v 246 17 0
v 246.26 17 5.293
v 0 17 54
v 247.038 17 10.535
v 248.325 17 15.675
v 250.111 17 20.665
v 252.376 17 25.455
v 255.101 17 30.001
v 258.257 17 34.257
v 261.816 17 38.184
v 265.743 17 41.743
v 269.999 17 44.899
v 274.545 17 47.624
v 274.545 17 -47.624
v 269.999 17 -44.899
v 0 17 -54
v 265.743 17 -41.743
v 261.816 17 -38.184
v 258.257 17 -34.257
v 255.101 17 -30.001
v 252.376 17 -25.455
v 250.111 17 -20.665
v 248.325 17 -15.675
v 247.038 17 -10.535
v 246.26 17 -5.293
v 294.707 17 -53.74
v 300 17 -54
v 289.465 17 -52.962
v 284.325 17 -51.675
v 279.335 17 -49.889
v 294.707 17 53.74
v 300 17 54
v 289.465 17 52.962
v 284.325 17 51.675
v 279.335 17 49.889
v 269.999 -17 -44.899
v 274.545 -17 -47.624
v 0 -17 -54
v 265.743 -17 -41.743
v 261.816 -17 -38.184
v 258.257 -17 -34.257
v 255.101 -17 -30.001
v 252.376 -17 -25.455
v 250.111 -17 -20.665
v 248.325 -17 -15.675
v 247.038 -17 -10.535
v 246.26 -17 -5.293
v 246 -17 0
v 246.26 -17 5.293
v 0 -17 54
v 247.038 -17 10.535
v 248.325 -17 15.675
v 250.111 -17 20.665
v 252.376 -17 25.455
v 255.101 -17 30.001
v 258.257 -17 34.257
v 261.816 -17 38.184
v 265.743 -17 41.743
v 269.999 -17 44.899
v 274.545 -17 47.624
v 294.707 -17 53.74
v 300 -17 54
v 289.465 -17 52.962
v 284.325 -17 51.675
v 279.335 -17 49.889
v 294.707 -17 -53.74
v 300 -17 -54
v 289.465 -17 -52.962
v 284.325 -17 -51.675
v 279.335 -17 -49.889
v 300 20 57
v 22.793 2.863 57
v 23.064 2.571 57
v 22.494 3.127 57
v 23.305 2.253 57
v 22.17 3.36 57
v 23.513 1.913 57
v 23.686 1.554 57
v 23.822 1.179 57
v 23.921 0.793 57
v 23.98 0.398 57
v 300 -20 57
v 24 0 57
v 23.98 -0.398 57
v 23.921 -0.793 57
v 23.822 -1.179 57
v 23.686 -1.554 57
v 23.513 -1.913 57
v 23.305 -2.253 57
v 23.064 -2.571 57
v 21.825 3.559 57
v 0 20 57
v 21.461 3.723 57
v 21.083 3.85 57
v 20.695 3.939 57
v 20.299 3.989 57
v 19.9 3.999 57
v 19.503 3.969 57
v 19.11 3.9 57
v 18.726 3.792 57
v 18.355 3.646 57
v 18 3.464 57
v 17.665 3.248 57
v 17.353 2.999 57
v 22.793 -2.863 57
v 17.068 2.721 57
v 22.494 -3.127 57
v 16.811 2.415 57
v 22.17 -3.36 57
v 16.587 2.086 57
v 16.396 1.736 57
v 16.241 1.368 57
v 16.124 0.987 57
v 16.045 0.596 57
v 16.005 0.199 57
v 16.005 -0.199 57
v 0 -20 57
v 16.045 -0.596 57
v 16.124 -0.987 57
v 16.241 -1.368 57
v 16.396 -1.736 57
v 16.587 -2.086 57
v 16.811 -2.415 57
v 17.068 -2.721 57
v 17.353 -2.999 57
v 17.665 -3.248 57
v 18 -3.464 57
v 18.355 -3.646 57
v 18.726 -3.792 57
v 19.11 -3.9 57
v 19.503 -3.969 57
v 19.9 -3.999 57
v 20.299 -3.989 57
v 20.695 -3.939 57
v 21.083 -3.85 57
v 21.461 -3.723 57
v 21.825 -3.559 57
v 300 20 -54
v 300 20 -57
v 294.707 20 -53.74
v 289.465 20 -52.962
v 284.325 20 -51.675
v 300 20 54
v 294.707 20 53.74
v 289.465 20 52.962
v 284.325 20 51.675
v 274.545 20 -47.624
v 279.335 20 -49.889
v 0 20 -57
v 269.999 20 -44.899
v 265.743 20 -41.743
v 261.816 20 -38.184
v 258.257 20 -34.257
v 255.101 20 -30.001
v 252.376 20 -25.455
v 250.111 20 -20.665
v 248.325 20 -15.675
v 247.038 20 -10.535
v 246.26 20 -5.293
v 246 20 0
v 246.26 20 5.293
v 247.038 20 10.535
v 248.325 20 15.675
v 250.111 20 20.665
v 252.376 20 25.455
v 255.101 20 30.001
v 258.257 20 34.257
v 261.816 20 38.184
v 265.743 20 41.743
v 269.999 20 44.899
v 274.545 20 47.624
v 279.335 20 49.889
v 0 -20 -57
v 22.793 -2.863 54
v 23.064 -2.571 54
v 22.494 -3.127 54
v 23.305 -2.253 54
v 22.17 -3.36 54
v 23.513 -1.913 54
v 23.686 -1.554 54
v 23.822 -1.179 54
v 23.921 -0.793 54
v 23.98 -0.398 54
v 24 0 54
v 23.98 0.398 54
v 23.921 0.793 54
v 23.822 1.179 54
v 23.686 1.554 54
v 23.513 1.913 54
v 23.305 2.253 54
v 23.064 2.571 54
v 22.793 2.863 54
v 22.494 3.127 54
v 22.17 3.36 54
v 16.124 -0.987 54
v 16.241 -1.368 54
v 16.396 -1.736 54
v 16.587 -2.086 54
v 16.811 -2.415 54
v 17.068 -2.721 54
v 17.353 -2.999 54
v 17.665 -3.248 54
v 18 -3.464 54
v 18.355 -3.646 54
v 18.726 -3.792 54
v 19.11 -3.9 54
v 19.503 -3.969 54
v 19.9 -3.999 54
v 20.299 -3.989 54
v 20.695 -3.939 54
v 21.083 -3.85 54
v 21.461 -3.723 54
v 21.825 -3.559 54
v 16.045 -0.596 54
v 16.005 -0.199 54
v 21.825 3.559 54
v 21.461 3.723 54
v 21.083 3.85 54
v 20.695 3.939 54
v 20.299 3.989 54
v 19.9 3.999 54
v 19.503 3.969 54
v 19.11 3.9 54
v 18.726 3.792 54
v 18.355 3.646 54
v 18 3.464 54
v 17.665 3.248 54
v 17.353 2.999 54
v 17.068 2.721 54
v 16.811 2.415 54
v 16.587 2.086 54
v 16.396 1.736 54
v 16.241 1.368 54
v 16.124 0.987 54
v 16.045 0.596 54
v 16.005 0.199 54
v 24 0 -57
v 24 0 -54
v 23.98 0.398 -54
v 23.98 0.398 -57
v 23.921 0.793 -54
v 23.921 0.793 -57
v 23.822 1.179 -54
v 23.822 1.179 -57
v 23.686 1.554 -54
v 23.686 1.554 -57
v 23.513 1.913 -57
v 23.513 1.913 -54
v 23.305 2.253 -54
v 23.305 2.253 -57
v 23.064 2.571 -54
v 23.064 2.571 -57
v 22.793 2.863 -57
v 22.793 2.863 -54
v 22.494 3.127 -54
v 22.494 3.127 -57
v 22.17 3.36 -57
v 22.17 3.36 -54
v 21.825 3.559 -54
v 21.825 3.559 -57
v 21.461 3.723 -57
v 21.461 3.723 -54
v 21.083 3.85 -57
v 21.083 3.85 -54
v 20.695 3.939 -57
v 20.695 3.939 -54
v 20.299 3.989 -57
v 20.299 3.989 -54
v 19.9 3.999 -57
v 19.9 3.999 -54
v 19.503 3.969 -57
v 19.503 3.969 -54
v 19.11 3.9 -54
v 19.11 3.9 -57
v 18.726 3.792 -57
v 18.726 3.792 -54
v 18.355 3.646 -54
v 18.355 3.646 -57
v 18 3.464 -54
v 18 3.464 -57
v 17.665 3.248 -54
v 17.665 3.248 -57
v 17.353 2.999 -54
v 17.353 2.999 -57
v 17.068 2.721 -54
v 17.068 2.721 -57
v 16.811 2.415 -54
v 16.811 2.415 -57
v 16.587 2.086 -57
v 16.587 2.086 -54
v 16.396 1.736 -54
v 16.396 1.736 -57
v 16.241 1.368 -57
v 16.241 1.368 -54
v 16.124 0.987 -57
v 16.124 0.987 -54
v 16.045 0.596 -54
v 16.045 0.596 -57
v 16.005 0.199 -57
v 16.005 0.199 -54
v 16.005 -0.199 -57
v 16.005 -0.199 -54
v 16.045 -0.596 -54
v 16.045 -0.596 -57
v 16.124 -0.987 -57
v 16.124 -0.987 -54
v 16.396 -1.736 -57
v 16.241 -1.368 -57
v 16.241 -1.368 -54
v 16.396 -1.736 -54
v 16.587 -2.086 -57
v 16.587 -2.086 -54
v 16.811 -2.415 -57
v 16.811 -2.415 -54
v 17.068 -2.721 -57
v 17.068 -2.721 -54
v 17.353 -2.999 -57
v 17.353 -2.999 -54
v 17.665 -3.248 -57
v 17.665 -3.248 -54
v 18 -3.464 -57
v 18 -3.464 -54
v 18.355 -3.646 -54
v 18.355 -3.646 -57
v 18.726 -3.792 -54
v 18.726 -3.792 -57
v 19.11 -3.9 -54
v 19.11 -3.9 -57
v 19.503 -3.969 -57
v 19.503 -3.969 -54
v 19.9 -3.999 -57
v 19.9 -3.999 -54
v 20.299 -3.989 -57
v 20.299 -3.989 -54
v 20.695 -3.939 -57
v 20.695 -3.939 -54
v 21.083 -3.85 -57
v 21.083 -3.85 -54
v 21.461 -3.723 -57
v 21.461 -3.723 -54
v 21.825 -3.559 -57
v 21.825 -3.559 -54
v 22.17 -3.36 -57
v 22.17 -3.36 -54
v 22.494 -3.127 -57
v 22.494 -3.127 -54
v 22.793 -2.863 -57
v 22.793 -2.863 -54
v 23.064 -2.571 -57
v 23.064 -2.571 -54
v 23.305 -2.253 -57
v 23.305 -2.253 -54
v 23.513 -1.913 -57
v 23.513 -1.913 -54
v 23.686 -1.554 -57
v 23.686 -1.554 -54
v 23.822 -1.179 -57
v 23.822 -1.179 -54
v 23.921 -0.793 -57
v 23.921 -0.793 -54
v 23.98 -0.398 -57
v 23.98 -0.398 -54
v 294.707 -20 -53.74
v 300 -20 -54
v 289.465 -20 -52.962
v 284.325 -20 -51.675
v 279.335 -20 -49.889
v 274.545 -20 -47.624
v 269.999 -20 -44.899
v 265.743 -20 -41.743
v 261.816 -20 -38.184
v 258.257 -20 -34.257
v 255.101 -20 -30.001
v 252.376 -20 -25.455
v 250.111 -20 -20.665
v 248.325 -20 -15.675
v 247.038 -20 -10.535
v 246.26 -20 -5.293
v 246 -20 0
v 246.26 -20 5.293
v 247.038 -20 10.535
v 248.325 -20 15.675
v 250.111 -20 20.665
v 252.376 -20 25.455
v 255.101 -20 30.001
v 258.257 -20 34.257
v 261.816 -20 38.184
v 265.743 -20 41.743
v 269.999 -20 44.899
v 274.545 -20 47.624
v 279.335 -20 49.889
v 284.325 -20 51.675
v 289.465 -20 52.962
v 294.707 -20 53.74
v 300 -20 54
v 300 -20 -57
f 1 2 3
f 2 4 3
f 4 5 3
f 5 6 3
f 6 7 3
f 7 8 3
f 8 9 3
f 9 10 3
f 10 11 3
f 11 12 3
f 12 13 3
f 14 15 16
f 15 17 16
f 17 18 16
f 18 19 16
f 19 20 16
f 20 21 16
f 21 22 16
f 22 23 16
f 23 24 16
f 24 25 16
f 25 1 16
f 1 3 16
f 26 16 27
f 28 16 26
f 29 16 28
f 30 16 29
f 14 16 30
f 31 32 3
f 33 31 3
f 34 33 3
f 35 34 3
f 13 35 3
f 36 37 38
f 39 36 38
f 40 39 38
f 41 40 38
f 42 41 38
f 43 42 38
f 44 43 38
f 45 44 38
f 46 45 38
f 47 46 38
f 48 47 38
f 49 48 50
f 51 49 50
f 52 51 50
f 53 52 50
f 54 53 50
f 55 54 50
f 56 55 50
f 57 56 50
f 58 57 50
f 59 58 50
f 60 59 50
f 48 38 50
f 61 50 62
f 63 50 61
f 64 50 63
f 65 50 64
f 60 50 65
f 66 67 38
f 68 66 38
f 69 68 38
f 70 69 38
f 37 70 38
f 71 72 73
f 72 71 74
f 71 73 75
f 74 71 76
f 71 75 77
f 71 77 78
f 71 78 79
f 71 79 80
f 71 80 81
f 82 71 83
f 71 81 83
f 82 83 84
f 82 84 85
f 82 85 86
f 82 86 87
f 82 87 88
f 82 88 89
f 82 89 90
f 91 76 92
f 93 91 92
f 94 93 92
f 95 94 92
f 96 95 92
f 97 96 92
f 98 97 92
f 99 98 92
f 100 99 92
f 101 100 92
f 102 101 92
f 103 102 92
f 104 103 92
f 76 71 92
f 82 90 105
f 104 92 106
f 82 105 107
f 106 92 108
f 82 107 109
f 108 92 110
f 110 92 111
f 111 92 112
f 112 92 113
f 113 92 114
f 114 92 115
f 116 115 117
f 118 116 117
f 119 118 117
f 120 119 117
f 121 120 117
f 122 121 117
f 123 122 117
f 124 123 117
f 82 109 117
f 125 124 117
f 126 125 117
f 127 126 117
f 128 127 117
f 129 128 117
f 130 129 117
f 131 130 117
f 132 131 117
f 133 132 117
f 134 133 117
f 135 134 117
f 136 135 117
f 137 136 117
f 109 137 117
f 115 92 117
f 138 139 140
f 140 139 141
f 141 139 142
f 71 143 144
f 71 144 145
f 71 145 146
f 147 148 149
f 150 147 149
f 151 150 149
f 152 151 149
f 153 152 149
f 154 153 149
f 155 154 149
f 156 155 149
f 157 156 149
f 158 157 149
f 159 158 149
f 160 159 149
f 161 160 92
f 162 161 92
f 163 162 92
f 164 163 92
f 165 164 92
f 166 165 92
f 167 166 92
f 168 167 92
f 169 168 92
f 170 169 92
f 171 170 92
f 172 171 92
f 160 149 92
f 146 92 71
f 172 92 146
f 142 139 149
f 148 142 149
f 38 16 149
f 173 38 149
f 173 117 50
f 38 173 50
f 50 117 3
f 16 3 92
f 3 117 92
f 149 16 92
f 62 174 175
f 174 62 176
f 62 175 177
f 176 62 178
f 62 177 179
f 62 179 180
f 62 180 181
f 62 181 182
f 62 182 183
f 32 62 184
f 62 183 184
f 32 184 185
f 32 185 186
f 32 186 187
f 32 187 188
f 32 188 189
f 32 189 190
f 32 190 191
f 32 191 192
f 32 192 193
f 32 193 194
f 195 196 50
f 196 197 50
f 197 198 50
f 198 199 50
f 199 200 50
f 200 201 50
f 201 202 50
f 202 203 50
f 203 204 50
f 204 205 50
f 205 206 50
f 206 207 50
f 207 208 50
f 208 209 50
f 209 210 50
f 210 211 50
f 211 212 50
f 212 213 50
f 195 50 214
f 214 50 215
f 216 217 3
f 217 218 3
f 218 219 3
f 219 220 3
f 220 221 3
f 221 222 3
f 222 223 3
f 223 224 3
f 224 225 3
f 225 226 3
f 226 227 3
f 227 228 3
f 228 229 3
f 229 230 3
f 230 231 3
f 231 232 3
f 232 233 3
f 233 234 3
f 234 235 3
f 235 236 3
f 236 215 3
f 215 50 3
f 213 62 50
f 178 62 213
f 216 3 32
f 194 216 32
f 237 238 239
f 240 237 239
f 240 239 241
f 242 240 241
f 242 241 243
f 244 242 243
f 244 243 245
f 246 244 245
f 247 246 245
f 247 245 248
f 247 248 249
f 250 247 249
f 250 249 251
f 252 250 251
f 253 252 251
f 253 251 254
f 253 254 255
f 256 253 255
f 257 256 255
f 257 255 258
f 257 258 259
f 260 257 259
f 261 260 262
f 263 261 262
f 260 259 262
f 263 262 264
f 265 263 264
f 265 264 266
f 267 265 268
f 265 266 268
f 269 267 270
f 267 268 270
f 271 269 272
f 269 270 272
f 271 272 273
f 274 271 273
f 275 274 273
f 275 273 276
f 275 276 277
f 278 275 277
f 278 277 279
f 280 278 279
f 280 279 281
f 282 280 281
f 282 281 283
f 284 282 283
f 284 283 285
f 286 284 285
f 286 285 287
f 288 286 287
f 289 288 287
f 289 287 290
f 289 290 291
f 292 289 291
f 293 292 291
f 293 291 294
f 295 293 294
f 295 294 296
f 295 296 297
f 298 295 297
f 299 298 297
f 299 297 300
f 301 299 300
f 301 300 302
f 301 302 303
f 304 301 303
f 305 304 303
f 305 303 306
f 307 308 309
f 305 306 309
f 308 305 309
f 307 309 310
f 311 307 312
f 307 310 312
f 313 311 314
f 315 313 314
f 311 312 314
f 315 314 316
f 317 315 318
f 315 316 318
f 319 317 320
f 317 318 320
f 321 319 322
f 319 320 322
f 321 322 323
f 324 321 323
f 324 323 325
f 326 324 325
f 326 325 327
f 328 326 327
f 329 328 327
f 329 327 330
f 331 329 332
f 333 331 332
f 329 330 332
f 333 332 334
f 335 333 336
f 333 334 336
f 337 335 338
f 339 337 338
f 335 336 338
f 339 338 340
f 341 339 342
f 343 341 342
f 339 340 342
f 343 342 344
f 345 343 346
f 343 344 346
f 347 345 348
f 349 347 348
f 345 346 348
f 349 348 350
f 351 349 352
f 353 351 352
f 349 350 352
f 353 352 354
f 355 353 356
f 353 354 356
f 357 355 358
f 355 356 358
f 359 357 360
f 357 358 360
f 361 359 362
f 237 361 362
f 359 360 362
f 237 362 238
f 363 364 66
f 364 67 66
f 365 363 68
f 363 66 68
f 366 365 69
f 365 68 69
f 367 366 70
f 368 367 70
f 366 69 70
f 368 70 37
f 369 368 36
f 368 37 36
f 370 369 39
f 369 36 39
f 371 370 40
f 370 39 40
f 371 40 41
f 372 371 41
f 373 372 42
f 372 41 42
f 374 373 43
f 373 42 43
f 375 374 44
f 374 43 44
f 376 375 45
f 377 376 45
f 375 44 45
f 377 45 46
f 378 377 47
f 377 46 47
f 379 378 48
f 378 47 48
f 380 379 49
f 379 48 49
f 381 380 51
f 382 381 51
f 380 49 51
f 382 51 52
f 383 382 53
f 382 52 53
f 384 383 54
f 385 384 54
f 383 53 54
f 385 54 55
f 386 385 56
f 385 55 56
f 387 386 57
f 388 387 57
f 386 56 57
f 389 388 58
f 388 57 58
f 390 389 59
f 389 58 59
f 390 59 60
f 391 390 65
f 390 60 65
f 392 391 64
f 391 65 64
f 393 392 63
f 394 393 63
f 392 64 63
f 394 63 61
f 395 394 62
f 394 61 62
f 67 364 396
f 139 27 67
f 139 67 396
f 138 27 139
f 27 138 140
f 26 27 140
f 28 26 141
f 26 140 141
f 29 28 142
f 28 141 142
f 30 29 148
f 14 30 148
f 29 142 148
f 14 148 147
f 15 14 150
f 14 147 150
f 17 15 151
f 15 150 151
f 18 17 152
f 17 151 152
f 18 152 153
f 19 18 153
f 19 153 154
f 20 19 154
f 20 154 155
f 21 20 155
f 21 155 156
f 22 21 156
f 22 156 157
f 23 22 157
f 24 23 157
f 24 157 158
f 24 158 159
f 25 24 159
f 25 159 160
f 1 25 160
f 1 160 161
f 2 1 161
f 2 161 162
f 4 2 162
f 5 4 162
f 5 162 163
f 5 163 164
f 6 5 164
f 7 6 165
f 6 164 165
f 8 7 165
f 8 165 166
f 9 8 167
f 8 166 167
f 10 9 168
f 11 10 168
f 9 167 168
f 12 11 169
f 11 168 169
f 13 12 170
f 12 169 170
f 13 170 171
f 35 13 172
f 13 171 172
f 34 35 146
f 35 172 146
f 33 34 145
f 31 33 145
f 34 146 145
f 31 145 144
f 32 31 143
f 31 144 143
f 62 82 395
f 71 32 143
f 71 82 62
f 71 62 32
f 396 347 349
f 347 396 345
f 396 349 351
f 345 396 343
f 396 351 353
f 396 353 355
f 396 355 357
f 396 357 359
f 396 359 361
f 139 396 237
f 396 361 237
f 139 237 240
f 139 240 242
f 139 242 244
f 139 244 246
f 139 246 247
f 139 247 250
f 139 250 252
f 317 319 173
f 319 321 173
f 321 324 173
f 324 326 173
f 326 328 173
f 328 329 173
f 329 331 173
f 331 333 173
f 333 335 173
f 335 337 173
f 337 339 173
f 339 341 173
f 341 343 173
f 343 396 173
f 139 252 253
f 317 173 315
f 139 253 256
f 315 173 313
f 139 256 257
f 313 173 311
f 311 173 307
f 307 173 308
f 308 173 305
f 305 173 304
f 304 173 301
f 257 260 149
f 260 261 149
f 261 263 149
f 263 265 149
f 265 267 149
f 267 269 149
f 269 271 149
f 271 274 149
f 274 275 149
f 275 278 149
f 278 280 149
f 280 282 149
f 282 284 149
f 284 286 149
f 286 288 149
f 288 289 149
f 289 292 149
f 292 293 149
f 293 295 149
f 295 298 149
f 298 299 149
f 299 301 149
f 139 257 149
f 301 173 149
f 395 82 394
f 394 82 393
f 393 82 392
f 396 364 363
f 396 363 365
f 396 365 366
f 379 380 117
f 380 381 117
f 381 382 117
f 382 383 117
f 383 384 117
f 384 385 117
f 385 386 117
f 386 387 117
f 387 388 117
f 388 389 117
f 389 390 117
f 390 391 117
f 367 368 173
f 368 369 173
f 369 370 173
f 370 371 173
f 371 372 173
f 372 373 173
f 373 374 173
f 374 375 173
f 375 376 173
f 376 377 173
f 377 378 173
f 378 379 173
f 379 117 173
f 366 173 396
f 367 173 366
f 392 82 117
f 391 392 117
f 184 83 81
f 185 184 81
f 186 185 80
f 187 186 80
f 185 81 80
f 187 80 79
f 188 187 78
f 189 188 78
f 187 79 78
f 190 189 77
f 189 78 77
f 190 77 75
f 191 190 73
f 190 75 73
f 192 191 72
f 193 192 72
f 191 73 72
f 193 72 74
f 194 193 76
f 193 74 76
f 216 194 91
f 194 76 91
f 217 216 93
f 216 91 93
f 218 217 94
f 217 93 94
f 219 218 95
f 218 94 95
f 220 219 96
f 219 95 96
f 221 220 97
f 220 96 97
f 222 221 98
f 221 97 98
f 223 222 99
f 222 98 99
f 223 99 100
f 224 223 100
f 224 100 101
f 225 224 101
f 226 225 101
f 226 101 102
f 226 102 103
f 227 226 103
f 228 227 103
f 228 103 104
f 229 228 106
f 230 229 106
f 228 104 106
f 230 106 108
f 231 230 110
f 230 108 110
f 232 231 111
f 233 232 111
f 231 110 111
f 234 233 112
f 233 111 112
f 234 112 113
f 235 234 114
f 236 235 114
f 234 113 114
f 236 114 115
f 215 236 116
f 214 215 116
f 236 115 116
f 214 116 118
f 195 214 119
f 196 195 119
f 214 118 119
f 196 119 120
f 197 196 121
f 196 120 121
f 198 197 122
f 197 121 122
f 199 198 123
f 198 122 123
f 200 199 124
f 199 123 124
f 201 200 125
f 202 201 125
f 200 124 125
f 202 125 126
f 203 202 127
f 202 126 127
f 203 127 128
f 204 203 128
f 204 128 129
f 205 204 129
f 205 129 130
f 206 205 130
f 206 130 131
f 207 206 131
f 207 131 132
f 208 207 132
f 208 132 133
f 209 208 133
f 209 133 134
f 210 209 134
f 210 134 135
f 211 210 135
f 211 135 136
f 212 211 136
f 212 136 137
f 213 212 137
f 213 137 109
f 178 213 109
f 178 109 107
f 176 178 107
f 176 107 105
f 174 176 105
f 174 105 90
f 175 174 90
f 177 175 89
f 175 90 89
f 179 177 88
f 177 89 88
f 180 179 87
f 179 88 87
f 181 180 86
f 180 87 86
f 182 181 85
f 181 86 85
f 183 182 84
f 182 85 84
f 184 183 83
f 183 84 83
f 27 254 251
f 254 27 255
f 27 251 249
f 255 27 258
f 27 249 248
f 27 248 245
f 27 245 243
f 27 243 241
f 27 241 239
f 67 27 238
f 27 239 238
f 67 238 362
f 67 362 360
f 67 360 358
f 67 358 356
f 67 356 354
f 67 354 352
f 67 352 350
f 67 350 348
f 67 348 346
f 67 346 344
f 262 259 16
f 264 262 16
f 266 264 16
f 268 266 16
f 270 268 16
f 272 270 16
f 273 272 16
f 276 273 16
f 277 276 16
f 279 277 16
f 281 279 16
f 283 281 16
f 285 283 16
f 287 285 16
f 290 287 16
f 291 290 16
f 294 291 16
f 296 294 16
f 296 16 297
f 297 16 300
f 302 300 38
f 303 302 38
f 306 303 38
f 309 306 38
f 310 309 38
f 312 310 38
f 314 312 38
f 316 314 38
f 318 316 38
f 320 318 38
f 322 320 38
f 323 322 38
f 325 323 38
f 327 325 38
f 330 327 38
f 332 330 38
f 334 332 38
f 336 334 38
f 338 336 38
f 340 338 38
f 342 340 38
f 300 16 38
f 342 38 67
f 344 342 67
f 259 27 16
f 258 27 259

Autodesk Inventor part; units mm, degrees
ref_plane "YZ Plane" through (0, 0, 0) normal (1, 0, 0) x (0, 1, 0)
ref_plane "XZ Plane" through (0, 0, 0) normal (0, 1, 0) x (-1, 0, 0)
ref_plane "XY Plane" through (0, 0, 0) normal (0, 0, 1) x (1, 0, 0)
sketch "Sketch1" plane through (0, 0, 0) normal (1, 0, 0) x (0, 1, 0)
  line L0 (20, 57) -> (-20, 57)
  line L1 (-20, 57) -> (-20, -57)
  line L2 (-20, -57) -> (20, -57)
  line L3 (20, -57) -> (20, 57)
  line L4 (20, 57) -> (-20, -57) construction
  line L5 (-20, 57) -> (20, -57) construction
  line L6 (-17, 54) -> (17, 54)
  line L7 (17, 54) -> (17, -54)
  line L8 (17, -54) -> (-17, -54)
  line L9 (-17, -54) -> (-17, 54)
  line L10 (-17, 54) -> (17, -54) construction
  line L11 (17, 54) -> (-17, -54) construction
  point P0 (0, 0)
  point P1 (0, -57)
  point P2 (0, -54)
  dimension "d0" = 114
  dimension "d1" = 40
  dimension "d2" = 3
  dimension "d3" = 3
extrude "Extrusion1" add sketch "Sketch1" along normal blind 300
sketch "Sketch2" plane through (0, 20, 57) normal (0, 1, 0) x (1, 0, 0)
  line L0 (300, 114) -> (300, 0) projected
  circle A0 centre (300, 57) radius 54
  point P0 (0, 57)
  point P1 (300, 111)
  point P2 (300, 3)
extrude "Extrusion2" cut sketch "Sketch2" against normal through all contours L0 A0 picked at (282.6871, 52.0741)
sketch "Sketch3" plane through (0, -20, 57) normal (0, 0, 1) x (1, 0, 0)
  circle A0 centre (20, 20) radius 4
  line L0 (0, 40) -> (0, 0) projected
  point P0 (0, 20)
  point P1 (0, 20)
  dimension "d8" = 8
  dimension "d9" = 20
extrude "Extrusion3" cut sketch "Sketch3" against normal through all
properties part number "AirIntake"
